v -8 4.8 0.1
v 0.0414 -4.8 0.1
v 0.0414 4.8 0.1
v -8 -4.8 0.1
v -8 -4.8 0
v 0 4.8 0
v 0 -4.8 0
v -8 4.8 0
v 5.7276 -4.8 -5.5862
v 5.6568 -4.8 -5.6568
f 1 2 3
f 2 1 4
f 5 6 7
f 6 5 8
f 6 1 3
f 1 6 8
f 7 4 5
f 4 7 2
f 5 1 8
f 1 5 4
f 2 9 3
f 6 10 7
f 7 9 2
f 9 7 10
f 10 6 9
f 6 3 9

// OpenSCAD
use <../lib.scad>
function ldraw_lib__164575cc01() = [
// 0 Sticker Train Front  2 x  6 Stripe Left (Formed)
// 0 Name: 164575cc01.dat
// 0 Author: Max Martin Richter [MMR1988]
// 0 !LDRAW_ORG Part UPDATE 2014-01
// 0 !LICENSE Licensed under CC BY 4.0 : see CAreadme.txt
// 
// 0 BFC CERTIFY CCW
  [0,"BFC","CERTIFY"],
  [0,"BFC","CCW"],
// 
// 0 !HISTORY 2014-06-21 [PTadmin] Official Update 2014-01
// 
// 
// 4 15 -20 -0.25 -12 0.1036 -0.25 -12 0.1036 -0.25 12 -20 -0.25 12
  [4,15,-20,-0.25,-12,0.1036,-0.25,-12,0.1036,-0.25,12,-20,-0.25,12],
// 4 16 -20 0 12 0 0 12 0 0 -12 -20 0 -12
  [4,16,-20,0,12,0,0,12,0,0,-12,-20,0,-12],
// 4 16 -20 -0.25 12 0.1036 -0.25 12 0 0 12 -20 0 12
  [4,16,-20,-0.25,12,0.1036,-0.25,12,0,0,12,-20,0,12],
// 4 16 0.1036 -0.25 -12 -20 -0.25 -12 -20 0 -12 0 0 -12
  [4,16,0.1036,-0.25,-12,-20,-0.25,-12,-20,0,-12,0,0,-12],
// 4 16 -20 -0.25 -12 -20 -0.25 12 -20 0 12 -20 0 -12
  [4,16,-20,-0.25,-12,-20,-0.25,12,-20,0,12,-20,0,-12],
// 
// 3 15 0.1036 -0.25 -12 14.3189 13.9654 -12 0.1036 -0.25 12
  [3,15,0.1036,-0.25,-12,14.3189,13.9654,-12,0.1036,-0.25,12],
// 3 16 0 0 12 14.1421 14.1421 -12 0 0 -12
  [3,16,0,0,12,14.1421,14.1421,-12,0,0,-12],
// 4 16 0 0 -12 14.1421 14.1421 -12 14.3189 13.9654 -12 0.1036 -0.25 -12
  [4,16,0,0,-12,14.1421,14.1421,-12,14.3189,13.9654,-12,0.1036,-0.25,-12],
// 3 16 14.1421 14.1421 -12 0 0 12 14.3189 13.9654 -12
  [3,16,14.1421,14.1421,-12,0,0,12,14.3189,13.9654,-12],
// 3 16 0 0 12 0.1036 -0.25 12 14.3189 13.9654 -12
  [3,16,0,0,12,0.1036,-0.25,12,14.3189,13.9654,-12],
];
module ldraw_lib__164575cc01(step=0, col=false, unit=2/5, alt=false, line=0.2, solid=!$preview)
    makepoly(ldraw_lib__164575cc01(), step=step, col=col, unit=unit, alt=alt, line=line, solid=solid);
ldraw_lib__164575cc01(line=0.2);
